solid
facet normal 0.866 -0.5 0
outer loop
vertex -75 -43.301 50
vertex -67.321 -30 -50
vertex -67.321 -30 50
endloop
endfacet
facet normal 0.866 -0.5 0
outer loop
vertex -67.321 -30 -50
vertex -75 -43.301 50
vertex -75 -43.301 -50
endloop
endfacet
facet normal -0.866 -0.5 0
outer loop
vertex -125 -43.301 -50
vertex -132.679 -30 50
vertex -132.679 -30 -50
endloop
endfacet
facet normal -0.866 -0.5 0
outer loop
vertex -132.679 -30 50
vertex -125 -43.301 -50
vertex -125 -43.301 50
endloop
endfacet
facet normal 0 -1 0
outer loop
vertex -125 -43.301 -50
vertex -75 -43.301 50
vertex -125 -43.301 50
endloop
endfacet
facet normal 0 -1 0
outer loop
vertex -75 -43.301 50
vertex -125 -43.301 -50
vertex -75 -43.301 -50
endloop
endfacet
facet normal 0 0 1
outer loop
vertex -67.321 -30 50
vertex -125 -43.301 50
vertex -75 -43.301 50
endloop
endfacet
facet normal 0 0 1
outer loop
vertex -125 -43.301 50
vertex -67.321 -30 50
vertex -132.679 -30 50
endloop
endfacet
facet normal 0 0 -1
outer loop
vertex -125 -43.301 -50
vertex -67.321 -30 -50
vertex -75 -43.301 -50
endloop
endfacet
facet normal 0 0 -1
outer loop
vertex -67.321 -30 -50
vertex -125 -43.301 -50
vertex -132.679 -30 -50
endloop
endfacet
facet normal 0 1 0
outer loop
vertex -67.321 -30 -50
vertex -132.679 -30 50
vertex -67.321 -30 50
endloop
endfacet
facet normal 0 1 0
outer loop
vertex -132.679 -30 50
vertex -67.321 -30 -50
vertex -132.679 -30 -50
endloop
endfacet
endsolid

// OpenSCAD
// file: liposlide.scad
$fn = 6;
module 3sliposlide(){

    translate([0, 0, 20]){
        rotate([0, 90, 0]){
            difference(){
                cube([171, 90, 40], center = true);
                translate([5.55, 0, 0]){
                    cube([160, 79, 31], center = true);
                }
            }    
        }
    }
    translate([-60,0,20]){
        rotate([0, 180, 0]){
            slide(171);
        }
    }

}
module slide(height){
    rotate([0, 0, -30]){
        difference(){
            cylinder(height, d = 100, center= true);
            
                rotate([0,0, 30]){
                    translate([20, 0, 0]){
                        cube([100, 100, height+1], center = true);                    
                    }
    
                }
    
        }
    }
}

3sliposlide();
// main file
use <liposlide.scad>
module pislide(){
    translate([-100, 0, 0]){
        rotate([0, 0, 90]){
            slide(100);
        }
    }
    
    
}
pislide();
